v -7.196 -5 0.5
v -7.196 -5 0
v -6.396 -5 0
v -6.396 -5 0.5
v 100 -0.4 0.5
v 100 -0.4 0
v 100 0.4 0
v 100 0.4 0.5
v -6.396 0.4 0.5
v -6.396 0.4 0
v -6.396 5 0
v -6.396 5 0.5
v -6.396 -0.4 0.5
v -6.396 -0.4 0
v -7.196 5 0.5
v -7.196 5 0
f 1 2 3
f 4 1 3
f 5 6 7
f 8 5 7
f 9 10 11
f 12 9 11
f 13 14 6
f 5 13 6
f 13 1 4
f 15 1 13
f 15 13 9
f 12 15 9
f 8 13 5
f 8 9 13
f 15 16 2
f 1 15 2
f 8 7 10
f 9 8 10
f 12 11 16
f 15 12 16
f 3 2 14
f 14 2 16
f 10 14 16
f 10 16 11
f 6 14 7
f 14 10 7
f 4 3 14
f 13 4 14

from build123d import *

# Parameters (mm, degrees)
PAD_DEPTH = 0.5


with BuildPart() as part:
    # Sketch → Pad (new body)
    with BuildSketch(Plane.XY):
        Polygon((-7.195606, 5), (-7.195606, 0), (-7.195606, -5), (-6.795606, -5), (-6.395606, -5), (-6.395606, -0.4), (0, -0.4), (100, -0.4), (100, 0.4), (0, 0.4), (-6.395606, 0.4), (-6.395606, 5), (-6.795606, 5), align=None)
    extrude(amount=PAD_DEPTH)


solid = part.part
